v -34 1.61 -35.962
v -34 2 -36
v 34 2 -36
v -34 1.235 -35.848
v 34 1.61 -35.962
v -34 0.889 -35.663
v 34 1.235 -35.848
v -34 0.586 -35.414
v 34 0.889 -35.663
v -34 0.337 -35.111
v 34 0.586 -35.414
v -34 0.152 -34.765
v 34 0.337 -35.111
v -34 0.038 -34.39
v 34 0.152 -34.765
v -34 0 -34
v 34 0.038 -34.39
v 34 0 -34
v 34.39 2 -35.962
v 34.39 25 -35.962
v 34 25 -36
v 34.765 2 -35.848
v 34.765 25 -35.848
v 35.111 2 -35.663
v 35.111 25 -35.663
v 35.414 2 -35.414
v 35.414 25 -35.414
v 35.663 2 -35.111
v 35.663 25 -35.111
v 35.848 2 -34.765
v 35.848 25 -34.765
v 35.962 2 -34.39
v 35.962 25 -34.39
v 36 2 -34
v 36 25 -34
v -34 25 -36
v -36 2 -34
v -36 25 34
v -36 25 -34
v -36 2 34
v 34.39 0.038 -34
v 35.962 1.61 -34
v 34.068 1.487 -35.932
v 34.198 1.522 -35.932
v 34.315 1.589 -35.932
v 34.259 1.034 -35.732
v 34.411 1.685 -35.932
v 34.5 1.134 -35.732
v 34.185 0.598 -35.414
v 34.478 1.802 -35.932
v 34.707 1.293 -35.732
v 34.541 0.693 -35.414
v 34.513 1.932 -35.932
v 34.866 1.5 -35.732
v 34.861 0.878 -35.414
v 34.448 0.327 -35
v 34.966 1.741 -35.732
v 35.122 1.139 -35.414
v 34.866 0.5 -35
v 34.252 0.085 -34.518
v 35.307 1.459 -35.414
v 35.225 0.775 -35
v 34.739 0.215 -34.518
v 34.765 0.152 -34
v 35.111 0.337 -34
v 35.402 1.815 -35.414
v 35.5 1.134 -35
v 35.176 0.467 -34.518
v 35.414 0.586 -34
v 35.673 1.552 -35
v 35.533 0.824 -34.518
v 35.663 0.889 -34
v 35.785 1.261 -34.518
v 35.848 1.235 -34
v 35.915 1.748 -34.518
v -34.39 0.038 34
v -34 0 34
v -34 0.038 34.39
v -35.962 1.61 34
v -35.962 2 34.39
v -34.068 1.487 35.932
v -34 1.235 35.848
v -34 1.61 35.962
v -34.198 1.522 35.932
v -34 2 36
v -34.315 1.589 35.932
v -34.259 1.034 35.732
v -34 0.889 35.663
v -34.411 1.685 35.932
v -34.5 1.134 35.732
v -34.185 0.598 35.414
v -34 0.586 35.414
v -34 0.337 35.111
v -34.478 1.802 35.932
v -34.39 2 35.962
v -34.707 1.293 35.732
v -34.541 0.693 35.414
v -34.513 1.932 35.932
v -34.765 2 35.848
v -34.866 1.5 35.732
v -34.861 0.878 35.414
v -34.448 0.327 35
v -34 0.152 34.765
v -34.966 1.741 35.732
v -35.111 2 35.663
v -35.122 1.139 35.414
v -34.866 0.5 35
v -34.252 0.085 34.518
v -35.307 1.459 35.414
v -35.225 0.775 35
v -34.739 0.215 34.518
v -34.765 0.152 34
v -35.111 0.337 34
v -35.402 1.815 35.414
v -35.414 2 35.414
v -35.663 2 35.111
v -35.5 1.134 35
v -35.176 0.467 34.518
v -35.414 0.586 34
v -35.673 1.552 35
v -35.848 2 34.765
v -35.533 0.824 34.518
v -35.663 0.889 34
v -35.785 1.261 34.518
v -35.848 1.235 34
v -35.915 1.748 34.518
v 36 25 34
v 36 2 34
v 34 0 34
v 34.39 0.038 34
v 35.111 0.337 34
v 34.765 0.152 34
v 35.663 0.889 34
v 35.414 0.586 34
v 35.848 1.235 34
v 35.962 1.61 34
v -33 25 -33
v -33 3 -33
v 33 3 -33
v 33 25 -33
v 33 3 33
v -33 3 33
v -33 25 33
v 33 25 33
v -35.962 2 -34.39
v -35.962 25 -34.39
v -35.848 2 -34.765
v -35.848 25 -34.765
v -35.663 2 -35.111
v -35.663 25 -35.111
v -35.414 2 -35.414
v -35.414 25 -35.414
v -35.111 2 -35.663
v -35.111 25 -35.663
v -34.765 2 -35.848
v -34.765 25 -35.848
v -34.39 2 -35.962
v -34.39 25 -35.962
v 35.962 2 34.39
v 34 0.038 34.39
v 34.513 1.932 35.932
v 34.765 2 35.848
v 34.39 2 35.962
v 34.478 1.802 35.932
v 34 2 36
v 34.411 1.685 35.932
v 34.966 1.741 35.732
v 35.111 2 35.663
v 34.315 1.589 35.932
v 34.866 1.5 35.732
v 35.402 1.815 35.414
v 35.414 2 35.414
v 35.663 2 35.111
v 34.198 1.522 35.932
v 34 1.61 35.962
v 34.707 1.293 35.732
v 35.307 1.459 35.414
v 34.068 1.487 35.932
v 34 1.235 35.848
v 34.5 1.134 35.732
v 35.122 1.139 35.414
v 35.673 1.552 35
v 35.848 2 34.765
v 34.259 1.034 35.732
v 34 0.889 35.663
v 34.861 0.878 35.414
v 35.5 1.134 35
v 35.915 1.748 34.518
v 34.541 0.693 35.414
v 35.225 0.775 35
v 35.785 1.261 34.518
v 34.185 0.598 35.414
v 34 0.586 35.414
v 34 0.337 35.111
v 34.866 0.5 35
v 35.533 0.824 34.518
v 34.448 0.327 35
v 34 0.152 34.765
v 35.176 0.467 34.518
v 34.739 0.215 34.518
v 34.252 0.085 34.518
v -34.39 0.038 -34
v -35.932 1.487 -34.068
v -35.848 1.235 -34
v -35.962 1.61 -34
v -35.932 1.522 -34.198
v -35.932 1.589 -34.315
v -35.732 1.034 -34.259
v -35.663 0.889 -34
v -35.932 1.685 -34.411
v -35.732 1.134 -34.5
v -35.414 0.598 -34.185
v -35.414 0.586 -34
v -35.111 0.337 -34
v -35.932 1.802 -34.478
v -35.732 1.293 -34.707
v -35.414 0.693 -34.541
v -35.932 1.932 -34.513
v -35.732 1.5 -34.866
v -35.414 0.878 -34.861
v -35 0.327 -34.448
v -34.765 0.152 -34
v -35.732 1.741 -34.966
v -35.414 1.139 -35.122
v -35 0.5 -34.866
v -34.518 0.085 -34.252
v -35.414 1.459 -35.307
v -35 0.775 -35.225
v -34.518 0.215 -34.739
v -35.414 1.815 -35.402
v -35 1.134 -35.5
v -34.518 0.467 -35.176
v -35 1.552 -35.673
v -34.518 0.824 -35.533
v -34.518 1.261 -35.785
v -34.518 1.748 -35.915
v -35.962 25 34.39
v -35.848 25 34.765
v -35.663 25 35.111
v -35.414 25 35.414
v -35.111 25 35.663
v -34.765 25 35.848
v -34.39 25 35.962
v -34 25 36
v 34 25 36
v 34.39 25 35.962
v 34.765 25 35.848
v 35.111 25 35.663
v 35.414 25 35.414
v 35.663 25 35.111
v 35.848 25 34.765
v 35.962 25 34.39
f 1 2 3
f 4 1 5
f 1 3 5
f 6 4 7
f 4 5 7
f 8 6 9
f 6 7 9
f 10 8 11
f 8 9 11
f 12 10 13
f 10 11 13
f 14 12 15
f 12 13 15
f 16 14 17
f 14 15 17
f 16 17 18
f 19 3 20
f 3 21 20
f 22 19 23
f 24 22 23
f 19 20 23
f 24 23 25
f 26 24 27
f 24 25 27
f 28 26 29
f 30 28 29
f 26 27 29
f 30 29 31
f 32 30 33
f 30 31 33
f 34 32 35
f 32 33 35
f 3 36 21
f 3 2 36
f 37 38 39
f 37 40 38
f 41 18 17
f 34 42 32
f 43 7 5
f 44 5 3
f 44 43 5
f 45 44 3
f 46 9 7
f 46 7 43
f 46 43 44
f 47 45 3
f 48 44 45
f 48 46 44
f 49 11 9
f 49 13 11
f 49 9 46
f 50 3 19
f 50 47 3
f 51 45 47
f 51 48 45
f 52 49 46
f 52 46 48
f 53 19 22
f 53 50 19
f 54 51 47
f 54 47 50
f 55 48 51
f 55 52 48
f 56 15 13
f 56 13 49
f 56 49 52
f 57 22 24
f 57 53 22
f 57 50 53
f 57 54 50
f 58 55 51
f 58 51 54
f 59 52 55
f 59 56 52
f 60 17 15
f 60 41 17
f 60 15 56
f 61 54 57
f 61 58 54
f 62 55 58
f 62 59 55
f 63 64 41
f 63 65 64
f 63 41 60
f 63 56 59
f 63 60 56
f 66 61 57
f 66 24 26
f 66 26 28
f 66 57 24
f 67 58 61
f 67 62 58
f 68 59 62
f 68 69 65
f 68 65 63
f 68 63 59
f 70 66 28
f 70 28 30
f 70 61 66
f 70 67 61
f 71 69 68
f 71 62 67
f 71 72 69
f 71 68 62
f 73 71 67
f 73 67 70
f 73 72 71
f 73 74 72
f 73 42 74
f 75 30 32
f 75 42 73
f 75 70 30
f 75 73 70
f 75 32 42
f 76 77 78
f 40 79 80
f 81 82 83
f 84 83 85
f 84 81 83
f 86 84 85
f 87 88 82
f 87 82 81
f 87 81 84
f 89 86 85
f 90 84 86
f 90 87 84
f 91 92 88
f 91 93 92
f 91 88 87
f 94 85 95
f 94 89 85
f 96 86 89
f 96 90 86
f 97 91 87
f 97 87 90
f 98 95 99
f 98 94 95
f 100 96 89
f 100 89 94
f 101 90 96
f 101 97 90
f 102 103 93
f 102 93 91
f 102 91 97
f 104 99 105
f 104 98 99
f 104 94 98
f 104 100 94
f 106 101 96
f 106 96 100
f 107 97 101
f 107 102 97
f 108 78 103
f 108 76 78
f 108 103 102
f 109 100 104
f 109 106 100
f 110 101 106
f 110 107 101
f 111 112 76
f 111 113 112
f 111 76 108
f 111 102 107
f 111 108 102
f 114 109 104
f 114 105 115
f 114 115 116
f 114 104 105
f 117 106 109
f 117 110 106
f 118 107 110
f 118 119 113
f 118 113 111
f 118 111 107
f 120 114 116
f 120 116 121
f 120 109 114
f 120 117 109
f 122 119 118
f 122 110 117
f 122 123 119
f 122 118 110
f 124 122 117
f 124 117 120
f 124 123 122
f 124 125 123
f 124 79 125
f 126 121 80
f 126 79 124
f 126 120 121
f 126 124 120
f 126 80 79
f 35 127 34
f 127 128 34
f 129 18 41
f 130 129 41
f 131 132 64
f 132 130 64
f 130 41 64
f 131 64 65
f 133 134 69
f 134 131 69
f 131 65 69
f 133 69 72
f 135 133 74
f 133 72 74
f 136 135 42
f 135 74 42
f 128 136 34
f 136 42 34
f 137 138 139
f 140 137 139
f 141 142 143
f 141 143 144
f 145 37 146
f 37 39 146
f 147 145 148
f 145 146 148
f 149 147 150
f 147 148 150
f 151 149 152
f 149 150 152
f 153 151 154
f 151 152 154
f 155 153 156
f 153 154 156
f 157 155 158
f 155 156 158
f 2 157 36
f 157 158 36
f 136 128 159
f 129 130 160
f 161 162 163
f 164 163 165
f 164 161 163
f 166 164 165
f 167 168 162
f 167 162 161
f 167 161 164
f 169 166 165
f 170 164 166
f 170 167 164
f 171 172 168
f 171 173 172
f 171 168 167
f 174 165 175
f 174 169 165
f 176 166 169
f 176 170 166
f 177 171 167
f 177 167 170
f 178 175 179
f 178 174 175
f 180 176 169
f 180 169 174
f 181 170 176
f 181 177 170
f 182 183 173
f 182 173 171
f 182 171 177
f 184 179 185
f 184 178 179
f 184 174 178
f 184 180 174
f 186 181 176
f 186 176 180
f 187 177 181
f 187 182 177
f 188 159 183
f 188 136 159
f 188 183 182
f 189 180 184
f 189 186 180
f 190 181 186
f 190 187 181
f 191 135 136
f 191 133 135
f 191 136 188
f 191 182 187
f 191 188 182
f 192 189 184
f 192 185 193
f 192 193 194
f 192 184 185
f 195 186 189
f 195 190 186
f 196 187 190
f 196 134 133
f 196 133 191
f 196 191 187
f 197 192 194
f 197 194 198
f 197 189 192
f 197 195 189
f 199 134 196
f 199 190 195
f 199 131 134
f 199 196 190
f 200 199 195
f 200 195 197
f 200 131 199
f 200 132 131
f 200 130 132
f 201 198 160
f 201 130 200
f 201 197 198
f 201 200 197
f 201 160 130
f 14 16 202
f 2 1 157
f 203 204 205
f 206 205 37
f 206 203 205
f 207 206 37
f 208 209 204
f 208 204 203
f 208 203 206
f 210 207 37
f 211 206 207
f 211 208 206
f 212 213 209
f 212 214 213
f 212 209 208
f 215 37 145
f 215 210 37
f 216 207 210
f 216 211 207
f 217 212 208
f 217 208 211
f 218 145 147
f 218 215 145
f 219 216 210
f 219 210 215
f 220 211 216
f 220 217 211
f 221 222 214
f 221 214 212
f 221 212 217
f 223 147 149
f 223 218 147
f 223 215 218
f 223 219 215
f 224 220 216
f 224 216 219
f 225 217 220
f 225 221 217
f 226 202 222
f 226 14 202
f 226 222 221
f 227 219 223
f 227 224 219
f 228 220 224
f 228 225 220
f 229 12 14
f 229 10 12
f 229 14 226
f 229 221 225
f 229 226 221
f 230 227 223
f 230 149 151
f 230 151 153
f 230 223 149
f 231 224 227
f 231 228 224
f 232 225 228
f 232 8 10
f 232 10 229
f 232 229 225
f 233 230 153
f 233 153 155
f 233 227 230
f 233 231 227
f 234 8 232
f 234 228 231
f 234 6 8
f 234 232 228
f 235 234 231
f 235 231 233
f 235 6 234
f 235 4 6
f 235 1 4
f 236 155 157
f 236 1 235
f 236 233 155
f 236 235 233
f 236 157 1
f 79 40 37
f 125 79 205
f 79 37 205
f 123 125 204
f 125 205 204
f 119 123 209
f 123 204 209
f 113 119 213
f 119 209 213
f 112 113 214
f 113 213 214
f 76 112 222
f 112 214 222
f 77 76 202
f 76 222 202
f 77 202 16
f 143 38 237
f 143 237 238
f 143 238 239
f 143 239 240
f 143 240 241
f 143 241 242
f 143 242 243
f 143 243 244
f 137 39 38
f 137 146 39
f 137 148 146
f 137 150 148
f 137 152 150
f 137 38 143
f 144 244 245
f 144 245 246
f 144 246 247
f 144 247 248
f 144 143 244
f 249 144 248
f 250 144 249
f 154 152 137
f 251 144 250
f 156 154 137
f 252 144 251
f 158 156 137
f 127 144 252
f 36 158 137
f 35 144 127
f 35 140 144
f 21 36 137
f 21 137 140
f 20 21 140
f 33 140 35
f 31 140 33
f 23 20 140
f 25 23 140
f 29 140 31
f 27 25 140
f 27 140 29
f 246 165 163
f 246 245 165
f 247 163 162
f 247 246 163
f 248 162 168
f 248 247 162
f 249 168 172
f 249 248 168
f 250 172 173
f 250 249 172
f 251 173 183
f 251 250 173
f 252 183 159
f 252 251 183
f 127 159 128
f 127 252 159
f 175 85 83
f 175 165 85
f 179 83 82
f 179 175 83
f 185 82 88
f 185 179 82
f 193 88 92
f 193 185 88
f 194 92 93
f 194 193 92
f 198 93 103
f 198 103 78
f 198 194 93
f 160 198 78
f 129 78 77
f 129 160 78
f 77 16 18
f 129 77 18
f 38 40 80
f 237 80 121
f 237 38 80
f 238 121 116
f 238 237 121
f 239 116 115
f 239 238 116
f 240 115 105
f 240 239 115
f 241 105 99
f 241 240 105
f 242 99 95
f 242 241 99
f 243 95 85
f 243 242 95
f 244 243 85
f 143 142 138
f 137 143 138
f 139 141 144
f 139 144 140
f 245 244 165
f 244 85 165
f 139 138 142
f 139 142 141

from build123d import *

# Parameters (mm, degrees)
SKETCH_1_W        = 66
SKETCH_1_H        = 66
EXTRUDE_1_DEPTH   = 3
SKETCH_1_2_W      = 72
SKETCH_1_2_H      = 72
SKETCH_1_2_W_2    = 66
SKETCH_1_2_H_2    = 66
EXTRUDE_1_2_DEPTH = 25
FILLET_1_R        = 2


with BuildPart() as part:
    # 草图1 → Extrude 1 (new body)
    with BuildSketch(Plane(origin=(0, 0, 0), x_dir=(1, 0, 0), z_dir=(0, 1, 0))):
        Rectangle(SKETCH_1_W, SKETCH_1_H)
    extrude(amount=EXTRUDE_1_DEPTH)

    # 草图1<2> → Extrude 1 2 (add)
    with BuildSketch(Plane(origin=(0, 0, 0), x_dir=(1, 0, 0), z_dir=(0, 1, 0))):
        Rectangle(SKETCH_1_2_W, SKETCH_1_2_H)
        Rectangle(SKETCH_1_2_W_2, SKETCH_1_2_H_2, mode=Mode.SUBTRACT)
    extrude(amount=EXTRUDE_1_2_DEPTH)

    # 圆角1
    fillet_1_edges = [part.edges().sort_by_distance(p)[0] for p in [
        (36, 0, 0),
        (36, 12.5, 36),
        (0, 0, -36),
        (36, 12.5, -36),
        (-36, 0, 0),
        (-36, 12.5, -36),
        (0, 0, 36),
        (-36, 12.5, 36),
    ]]
    fillet(fillet_1_edges, radius=FILLET_1_R)


solid = part.part
